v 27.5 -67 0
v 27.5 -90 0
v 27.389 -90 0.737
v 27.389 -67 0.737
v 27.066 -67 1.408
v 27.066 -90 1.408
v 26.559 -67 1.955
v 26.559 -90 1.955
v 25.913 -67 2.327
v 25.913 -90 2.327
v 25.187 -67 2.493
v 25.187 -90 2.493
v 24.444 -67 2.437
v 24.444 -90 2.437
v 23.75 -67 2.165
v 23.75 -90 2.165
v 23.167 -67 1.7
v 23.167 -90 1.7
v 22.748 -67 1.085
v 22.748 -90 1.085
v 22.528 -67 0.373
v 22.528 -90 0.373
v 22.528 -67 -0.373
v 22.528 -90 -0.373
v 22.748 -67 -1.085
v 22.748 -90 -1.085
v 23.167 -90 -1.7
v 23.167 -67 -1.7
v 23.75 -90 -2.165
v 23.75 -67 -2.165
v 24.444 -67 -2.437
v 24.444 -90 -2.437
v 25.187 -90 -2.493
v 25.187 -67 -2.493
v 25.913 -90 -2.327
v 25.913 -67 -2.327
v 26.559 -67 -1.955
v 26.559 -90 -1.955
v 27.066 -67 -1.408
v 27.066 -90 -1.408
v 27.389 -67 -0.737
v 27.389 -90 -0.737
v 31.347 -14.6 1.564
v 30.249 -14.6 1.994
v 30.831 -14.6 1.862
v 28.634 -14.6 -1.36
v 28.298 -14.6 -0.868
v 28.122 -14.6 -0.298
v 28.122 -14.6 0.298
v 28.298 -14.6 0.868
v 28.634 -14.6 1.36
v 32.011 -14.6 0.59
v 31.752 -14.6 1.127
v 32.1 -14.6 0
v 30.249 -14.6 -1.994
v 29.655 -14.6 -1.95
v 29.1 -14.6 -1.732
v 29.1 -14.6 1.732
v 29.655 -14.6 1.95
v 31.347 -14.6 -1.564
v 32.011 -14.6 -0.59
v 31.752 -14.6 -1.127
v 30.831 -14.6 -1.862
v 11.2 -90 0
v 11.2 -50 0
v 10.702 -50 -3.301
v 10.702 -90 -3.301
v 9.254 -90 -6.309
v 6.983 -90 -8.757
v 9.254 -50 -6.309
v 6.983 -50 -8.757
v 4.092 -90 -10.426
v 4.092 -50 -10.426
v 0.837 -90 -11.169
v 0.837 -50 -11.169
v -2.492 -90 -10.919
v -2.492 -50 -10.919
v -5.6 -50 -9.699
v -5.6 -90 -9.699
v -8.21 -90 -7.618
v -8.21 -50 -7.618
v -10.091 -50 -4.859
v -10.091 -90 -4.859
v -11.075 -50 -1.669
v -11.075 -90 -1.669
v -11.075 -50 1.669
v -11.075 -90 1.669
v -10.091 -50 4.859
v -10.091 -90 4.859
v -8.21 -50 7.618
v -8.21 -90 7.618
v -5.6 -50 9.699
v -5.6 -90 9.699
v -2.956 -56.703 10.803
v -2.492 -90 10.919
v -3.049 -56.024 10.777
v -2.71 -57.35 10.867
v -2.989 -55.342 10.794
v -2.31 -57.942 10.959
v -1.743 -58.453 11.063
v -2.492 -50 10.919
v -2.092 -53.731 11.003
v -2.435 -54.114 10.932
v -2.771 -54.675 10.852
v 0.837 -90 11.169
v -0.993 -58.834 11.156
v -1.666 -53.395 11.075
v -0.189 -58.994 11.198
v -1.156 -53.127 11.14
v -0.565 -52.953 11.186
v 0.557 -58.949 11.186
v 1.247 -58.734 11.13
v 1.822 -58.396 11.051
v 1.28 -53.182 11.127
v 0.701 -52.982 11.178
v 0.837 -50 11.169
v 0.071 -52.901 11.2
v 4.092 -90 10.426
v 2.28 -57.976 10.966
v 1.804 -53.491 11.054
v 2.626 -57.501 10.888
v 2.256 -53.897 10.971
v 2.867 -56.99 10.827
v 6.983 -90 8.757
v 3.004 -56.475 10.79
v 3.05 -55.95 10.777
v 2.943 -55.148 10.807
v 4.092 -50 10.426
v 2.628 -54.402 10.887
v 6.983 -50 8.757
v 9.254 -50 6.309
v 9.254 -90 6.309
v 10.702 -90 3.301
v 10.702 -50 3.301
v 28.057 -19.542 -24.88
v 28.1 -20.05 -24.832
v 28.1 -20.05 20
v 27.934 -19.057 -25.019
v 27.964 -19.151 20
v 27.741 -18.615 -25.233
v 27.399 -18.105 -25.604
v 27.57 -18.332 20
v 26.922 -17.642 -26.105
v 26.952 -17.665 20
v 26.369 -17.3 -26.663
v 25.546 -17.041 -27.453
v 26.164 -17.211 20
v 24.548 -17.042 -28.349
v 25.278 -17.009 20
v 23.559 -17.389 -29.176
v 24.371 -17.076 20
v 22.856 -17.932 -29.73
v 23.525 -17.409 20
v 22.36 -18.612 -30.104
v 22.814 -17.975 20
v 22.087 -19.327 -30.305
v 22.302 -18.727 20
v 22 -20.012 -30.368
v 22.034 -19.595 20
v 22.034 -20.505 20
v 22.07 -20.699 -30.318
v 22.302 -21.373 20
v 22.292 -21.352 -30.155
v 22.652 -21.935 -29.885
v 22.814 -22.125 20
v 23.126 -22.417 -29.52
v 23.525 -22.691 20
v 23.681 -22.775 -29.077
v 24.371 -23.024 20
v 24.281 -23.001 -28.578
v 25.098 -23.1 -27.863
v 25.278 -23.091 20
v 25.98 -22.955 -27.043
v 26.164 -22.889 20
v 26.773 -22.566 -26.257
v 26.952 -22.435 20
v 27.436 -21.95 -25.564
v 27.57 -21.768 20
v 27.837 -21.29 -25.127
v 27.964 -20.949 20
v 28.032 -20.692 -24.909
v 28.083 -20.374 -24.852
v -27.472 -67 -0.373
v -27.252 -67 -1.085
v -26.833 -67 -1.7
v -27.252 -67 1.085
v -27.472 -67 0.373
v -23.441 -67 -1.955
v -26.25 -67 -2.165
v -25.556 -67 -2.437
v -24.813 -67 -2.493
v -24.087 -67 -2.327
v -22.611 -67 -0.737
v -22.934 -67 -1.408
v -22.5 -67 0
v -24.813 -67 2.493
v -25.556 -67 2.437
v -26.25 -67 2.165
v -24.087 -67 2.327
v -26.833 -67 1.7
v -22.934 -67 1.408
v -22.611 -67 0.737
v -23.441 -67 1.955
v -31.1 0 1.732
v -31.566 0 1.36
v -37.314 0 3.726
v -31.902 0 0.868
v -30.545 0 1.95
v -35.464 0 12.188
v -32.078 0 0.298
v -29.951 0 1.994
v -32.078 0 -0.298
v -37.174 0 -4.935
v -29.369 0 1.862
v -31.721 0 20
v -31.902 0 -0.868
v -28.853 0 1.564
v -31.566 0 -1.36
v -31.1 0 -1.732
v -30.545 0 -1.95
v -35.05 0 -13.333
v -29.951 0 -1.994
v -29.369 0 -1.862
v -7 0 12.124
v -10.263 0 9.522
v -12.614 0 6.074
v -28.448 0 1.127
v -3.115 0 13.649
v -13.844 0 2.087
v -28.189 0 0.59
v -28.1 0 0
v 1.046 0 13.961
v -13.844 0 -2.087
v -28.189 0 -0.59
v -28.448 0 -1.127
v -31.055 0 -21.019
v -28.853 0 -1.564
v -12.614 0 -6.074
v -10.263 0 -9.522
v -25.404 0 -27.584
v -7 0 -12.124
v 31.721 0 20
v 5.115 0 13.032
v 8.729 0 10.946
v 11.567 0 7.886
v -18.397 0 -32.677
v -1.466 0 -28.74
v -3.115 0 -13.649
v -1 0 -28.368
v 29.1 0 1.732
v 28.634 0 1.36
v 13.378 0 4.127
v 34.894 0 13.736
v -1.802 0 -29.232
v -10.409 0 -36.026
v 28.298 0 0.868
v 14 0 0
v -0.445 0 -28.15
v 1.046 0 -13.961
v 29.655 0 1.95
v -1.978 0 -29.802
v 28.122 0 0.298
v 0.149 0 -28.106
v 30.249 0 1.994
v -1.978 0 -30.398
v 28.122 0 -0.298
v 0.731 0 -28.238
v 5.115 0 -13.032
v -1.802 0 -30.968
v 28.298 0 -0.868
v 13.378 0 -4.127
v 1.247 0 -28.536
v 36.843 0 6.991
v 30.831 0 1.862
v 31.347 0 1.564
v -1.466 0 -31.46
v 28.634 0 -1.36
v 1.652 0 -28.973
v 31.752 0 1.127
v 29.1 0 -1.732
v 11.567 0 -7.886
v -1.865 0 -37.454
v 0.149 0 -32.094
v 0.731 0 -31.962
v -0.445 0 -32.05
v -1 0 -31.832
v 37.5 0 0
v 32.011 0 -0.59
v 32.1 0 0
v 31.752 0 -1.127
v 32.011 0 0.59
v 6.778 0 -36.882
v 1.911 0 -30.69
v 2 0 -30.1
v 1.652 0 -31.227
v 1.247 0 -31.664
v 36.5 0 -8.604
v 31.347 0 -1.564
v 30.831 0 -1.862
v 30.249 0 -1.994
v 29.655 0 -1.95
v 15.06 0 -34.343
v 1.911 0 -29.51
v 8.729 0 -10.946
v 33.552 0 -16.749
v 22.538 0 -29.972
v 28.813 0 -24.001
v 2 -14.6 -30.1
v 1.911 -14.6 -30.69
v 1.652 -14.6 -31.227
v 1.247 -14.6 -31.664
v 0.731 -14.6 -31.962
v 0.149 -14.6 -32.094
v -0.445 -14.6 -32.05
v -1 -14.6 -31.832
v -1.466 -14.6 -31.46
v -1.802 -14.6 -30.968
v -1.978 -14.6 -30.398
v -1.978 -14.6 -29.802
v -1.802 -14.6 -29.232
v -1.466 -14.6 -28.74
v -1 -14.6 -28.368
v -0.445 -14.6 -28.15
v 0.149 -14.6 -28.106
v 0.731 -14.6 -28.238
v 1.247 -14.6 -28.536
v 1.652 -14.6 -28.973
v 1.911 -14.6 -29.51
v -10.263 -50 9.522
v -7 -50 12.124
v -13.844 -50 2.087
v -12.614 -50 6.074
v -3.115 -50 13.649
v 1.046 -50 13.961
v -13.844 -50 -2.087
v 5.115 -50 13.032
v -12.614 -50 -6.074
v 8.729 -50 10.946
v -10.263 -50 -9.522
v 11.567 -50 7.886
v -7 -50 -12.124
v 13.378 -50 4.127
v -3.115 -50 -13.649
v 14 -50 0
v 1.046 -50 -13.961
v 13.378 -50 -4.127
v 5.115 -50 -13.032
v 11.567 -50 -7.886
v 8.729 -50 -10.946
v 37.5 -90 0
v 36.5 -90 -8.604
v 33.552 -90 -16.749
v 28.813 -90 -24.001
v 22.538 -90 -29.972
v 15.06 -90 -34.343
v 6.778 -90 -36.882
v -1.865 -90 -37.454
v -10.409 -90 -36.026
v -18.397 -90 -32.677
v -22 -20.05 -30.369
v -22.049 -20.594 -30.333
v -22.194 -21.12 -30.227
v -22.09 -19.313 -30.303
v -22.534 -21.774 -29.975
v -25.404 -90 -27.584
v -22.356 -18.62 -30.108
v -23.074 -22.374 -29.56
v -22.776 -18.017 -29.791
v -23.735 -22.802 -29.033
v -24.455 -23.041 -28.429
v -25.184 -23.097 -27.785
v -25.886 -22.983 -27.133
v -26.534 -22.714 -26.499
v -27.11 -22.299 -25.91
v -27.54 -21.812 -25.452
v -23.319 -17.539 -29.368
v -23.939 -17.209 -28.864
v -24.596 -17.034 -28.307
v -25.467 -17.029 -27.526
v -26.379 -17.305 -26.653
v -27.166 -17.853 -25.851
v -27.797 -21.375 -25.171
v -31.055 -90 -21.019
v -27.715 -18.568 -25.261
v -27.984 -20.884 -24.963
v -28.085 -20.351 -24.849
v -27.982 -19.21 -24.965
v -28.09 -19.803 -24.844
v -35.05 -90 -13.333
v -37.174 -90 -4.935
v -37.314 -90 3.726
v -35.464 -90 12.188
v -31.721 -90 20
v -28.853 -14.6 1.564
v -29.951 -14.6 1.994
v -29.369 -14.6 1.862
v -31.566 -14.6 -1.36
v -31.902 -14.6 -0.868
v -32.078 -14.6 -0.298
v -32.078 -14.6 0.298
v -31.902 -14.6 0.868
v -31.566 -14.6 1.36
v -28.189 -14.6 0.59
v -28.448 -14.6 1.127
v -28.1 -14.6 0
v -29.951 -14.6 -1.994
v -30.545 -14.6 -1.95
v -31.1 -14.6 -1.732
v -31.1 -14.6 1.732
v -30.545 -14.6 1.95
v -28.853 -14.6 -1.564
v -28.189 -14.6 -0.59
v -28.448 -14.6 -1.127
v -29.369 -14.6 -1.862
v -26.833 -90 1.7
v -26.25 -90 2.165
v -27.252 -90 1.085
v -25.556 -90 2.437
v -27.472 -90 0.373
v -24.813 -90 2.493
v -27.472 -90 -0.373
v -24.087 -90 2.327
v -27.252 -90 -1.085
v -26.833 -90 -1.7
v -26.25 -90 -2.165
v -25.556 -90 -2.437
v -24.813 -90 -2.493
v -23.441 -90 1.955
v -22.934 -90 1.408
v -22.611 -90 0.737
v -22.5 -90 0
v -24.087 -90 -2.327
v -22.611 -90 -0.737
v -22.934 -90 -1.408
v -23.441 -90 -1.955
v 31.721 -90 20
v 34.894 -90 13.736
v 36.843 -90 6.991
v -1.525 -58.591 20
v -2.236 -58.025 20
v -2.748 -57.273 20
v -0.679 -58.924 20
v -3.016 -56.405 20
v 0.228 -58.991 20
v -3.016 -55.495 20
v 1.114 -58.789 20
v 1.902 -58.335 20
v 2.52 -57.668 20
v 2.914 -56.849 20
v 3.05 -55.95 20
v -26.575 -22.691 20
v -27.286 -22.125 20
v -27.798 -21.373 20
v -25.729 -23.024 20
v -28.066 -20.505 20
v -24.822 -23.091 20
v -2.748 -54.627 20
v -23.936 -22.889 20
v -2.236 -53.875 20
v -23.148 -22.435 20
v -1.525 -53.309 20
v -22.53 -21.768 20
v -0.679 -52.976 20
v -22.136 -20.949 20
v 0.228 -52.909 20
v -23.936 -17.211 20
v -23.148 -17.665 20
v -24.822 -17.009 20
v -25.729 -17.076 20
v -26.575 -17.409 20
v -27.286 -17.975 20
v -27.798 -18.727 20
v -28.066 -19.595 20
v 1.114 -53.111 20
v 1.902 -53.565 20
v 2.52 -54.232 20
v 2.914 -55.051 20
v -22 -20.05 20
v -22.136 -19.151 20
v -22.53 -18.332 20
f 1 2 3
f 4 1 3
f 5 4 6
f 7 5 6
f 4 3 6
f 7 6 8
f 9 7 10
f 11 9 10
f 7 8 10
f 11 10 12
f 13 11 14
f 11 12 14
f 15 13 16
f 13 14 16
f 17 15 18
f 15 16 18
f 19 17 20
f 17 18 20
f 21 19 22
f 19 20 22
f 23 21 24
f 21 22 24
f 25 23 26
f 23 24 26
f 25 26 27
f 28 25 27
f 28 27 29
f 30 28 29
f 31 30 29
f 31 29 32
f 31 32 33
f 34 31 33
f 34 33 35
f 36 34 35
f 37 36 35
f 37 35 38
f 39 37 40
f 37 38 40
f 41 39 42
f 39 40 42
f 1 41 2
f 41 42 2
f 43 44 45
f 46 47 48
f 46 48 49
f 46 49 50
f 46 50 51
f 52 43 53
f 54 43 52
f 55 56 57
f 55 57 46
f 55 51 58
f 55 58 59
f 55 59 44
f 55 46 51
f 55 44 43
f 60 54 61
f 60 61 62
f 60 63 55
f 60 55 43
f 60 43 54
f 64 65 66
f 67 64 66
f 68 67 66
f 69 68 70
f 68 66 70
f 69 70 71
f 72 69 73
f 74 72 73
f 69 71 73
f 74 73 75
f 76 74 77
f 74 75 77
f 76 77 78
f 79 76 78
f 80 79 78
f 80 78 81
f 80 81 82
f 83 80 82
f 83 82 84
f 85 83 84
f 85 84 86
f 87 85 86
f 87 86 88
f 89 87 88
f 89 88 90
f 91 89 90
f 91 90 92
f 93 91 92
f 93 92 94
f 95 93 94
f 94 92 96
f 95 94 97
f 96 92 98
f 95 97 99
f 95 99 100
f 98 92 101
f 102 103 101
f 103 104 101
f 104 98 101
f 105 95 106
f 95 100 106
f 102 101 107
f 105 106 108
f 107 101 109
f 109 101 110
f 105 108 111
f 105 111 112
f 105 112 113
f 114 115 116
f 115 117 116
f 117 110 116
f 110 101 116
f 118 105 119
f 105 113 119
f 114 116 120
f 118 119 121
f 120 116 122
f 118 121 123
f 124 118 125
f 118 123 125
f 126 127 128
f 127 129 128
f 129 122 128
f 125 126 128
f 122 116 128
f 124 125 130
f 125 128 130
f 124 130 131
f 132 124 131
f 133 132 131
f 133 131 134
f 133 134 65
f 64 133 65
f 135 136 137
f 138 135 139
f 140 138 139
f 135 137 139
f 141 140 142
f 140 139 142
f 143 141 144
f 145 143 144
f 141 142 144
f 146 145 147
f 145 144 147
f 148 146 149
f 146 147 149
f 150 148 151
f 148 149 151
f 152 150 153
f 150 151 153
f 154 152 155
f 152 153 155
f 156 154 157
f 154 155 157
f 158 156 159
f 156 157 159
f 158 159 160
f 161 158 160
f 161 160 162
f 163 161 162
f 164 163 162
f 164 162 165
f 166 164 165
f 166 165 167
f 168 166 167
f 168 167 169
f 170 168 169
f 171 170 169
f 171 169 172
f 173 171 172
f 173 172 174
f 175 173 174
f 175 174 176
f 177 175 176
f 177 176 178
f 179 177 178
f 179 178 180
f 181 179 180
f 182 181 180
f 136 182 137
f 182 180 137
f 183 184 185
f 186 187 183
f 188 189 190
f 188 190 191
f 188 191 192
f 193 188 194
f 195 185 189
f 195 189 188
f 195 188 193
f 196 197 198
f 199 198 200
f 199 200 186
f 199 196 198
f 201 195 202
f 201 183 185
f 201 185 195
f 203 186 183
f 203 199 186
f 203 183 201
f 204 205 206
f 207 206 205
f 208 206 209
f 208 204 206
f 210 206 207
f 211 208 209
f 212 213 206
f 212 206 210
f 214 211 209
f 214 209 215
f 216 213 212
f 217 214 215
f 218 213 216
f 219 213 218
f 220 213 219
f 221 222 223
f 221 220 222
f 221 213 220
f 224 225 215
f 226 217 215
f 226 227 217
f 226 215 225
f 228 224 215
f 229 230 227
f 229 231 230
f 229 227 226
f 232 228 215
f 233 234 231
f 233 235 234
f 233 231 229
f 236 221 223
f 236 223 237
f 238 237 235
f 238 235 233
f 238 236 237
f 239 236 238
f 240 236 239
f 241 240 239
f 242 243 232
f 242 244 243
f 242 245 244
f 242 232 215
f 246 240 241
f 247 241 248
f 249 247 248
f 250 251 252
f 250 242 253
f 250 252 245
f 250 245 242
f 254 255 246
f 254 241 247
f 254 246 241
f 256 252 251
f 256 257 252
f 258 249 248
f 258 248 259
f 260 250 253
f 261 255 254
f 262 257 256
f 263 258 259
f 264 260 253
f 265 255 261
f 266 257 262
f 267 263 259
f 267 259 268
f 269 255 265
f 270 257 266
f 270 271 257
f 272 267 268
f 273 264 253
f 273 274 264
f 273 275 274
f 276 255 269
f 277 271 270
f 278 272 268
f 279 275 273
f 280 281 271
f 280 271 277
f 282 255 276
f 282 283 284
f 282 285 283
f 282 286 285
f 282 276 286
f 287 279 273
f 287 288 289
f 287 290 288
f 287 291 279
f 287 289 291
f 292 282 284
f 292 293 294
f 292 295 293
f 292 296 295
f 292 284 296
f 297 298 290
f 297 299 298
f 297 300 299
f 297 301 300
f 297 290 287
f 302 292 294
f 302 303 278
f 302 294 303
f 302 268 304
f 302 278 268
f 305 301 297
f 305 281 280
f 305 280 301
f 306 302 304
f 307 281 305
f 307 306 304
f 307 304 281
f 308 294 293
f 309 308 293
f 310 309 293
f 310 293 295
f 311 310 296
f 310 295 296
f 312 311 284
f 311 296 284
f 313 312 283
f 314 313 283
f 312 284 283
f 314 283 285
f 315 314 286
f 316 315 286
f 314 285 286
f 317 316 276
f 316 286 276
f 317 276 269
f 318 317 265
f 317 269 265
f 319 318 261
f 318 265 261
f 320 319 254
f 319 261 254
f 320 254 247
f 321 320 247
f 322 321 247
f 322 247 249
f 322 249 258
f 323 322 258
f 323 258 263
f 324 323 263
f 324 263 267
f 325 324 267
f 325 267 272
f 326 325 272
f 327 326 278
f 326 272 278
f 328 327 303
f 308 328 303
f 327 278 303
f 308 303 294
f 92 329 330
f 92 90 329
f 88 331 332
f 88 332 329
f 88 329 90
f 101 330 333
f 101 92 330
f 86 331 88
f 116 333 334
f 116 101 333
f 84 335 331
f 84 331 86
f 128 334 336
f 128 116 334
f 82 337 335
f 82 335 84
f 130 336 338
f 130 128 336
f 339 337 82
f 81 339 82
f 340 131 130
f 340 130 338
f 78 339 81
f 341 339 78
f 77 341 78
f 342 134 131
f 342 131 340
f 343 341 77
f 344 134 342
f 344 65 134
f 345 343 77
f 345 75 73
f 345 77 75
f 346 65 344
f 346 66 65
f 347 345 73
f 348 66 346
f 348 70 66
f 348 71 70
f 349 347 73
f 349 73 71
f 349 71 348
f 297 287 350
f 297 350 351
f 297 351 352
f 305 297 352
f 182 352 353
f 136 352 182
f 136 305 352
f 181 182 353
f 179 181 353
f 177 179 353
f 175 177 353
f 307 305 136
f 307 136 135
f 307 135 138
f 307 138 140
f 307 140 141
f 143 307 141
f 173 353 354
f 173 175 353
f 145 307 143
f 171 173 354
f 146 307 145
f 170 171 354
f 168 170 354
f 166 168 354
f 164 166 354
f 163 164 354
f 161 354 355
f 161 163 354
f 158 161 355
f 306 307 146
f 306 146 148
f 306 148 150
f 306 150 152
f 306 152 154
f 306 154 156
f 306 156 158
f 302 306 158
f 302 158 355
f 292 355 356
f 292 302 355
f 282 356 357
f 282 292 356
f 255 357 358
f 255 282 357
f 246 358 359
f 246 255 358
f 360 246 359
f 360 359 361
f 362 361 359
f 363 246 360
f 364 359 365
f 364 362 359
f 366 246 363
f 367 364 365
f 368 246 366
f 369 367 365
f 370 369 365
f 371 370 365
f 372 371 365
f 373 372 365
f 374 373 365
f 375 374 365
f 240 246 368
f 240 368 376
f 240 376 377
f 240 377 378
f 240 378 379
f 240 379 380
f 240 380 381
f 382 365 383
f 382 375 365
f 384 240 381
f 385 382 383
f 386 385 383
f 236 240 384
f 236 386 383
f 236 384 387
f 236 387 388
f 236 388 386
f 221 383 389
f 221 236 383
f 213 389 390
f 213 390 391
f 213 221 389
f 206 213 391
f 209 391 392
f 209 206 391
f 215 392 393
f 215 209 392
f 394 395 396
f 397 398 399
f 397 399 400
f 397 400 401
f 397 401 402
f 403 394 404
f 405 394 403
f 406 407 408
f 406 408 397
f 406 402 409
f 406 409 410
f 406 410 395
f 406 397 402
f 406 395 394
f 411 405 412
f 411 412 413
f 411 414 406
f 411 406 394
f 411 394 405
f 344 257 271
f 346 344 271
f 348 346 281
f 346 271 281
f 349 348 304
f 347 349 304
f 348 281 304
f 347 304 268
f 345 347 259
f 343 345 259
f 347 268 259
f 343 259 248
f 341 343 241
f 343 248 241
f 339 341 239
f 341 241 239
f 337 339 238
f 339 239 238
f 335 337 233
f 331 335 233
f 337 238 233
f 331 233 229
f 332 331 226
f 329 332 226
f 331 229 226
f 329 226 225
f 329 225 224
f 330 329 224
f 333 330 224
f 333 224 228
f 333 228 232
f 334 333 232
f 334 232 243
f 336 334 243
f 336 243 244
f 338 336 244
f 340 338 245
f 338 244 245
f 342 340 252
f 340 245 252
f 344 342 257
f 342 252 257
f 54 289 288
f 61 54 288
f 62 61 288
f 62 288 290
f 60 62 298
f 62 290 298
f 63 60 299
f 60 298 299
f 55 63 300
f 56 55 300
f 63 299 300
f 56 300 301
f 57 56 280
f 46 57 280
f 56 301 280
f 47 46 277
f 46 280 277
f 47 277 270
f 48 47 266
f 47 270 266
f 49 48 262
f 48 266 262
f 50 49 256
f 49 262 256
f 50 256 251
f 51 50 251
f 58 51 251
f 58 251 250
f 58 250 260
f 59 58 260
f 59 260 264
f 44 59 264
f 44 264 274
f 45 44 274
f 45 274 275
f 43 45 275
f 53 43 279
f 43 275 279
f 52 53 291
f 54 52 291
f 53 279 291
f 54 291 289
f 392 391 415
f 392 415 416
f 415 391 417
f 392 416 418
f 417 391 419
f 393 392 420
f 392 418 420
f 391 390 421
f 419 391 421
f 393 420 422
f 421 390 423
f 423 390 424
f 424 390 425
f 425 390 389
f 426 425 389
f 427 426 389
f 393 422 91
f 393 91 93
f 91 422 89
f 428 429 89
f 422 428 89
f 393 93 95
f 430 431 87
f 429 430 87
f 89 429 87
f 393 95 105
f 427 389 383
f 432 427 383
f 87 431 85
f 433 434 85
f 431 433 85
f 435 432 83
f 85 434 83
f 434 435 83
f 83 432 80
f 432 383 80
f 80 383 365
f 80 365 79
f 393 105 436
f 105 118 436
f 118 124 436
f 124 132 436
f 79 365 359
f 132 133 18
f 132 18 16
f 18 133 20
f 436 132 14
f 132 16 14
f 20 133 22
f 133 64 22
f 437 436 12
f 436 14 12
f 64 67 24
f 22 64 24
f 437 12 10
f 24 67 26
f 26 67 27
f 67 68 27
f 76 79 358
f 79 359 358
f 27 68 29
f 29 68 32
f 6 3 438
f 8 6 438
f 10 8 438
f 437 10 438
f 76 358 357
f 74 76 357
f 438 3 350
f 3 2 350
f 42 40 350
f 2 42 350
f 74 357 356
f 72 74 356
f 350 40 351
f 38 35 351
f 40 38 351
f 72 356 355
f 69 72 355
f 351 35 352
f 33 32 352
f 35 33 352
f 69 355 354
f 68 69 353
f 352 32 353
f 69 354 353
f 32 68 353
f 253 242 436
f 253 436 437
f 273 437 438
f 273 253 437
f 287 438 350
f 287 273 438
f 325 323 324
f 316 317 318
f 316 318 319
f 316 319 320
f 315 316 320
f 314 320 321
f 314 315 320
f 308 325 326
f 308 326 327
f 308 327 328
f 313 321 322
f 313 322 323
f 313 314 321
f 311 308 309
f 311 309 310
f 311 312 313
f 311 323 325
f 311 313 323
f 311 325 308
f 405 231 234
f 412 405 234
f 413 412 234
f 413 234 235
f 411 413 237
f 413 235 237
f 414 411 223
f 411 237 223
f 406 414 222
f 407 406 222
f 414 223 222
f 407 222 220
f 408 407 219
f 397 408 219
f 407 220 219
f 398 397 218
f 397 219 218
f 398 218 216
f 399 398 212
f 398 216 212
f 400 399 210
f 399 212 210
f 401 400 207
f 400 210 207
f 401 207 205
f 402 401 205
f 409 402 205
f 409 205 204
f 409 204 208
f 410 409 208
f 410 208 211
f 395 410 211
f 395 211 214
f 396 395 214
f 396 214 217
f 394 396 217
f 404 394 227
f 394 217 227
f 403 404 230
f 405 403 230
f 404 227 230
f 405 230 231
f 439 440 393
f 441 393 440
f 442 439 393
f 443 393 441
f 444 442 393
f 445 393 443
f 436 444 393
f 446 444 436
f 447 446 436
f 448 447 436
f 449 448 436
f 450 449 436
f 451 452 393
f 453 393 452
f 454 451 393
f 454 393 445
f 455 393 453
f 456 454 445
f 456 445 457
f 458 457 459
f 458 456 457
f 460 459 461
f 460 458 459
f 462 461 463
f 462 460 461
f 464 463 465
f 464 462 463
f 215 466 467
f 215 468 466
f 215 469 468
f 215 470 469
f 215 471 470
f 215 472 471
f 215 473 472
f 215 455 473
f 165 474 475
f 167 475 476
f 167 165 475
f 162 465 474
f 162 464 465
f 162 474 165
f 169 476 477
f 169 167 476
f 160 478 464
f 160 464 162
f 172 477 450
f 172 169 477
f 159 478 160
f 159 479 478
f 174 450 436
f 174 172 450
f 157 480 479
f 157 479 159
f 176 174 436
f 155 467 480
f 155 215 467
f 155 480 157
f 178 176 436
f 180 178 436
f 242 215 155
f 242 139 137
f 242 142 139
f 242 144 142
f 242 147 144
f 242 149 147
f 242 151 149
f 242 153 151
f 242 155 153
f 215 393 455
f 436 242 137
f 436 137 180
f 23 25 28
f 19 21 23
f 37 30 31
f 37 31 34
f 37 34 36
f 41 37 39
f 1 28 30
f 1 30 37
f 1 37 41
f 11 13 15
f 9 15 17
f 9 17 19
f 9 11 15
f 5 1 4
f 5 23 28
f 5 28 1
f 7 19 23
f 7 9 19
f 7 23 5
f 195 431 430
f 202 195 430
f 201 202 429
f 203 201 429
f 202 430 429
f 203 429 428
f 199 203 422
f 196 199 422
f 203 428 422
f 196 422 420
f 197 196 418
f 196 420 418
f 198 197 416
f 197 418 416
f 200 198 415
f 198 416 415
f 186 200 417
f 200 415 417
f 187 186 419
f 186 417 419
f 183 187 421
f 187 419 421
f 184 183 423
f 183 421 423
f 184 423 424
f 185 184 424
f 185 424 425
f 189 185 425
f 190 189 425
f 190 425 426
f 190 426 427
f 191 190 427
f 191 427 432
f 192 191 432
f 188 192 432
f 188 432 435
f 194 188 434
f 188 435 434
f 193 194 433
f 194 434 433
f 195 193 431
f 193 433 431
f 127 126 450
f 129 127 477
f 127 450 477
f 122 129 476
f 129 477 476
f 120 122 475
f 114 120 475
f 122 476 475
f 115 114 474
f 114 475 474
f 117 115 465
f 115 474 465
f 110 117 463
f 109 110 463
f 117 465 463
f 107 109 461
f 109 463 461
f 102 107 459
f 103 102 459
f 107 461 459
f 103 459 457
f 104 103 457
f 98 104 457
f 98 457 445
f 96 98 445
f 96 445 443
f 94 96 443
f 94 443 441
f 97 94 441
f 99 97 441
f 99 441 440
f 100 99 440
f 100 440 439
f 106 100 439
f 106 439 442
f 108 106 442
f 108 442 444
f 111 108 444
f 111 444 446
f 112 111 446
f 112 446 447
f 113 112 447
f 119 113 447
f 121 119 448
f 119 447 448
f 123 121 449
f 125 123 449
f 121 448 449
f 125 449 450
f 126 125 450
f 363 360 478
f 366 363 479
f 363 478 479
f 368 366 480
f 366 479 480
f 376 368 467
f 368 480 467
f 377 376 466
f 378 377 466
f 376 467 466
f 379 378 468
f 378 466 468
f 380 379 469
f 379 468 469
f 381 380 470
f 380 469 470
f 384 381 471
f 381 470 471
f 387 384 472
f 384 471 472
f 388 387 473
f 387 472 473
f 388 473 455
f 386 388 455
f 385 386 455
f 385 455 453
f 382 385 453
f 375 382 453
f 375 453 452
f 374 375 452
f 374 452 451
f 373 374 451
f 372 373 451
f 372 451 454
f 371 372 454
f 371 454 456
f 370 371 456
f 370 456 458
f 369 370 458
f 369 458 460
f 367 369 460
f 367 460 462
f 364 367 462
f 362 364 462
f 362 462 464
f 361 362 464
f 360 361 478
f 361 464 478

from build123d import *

# Parameters (mm, degrees)
SKETCH1_R             = 11.2
BOSS_EXTRUDE1_DEPTH   = 90
SKETCH1_3_R           = 2
CORTE_EXTRUS_O1_DEPTH = 14.6
SKETCH1_4_R           = 14
SKETCH1_4_R_2         = 11.2
CORTE_EXTRUS_O2_DEPTH = 50
ESBO_O1_R             = 2.5
CORTE_EXTRUS_O3_DEPTH = 23
ESBO_O2_R             = 3.05
CORTE_EXTRUS_O4_DEPTH = 114.192314227
CORTE_EXTRUS_O5_REACH = 115.192


with BuildPart() as part:
    # Sketch1 → Boss-Extrude1 (new body)
    with BuildSketch(Plane(origin=(0, 0, 0), x_dir=(1, 0, 0), z_dir=(0, 1, 0))):
        with BuildLine():
            Line((-31.721443851, -20), (31.721443851, -20))
            ThreePointArc((31.721443851, -20), (0, 37.5), (-31.721443851, -20))
        make_face()
        Circle(SKETCH1_R, mode=Mode.SUBTRACT)
    extrude(amount=-BOSS_EXTRUDE1_DEPTH)

    # Sketch1_3 → Corte-extrus_o1 (cut)
    with BuildSketch(Plane(origin=(0, 0, 0), x_dir=(1, 0, 0), z_dir=(0, 1, 0))):
        with Locations((-30.1, 0)):
            Circle(SKETCH1_3_R)
        with Locations((30.1, 0)):
            Circle(SKETCH1_3_R)
        with Locations((0, 30.1)):
            Circle(SKETCH1_3_R)
    extrude(amount=-CORTE_EXTRUS_O1_DEPTH, mode=Mode.SUBTRACT)

    # Sketch1_4 → Corte-extrus_o2 (cut)
    with BuildSketch(Plane(origin=(0, 0, 0), x_dir=(1, 0, 0), z_dir=(0, 1, 0))):
        Circle(SKETCH1_4_R)
        Circle(SKETCH1_4_R_2, mode=Mode.SUBTRACT)
    extrude(amount=-CORTE_EXTRUS_O2_DEPTH, mode=Mode.SUBTRACT)

    # Esbo_o1 → Corte-extrus_o3 (cut)
    with BuildSketch(Plane.XZ.offset(90)):
        with Locations((-25, 0)):
            Circle(ESBO_O1_R)
        with Locations((25, 0)):
            Circle(ESBO_O1_R)
    extrude(amount=-CORTE_EXTRUS_O3_DEPTH, mode=Mode.SUBTRACT)

    # Esbo_o2 → Corte-extrus_o4 (cut, through all)
    with BuildSketch(Plane.XY.offset(20)):
        with Locations((-25.05, -20.05)):
            Circle(ESBO_O2_R)
        with Locations((25.05, -20.05)):
            Circle(ESBO_O2_R)
    extrude(amount=-CORTE_EXTRUS_O4_DEPTH, mode=Mode.SUBTRACT)

    # Esbo_o2_3 → Corte-extrus_o5 (cut, up to next)
    with BuildSketch(Plane.XY.offset(20), mode=Mode.PRIVATE) as corte_extrus_o5_sk1:
        with BuildLine():
            ThreePointArc((0, -59), (2.156675683, -58.106675683), (3.05, -55.95))
            ThreePointArc((3.05, -55.95), (-2.156675683, -53.793324317), (0, -59))
        make_face()
    corte_extrus_o5_tool1 = extrude(corte_extrus_o5_sk1.sketch, amount=-CORTE_EXTRUS_O5_REACH, mode=Mode.PRIVATE) & part.part
    add(corte_extrus_o5_tool1.solids().sort_by_distance((0, -55.95, 20))[0], mode=Mode.SUBTRACT)


solid = part.part
